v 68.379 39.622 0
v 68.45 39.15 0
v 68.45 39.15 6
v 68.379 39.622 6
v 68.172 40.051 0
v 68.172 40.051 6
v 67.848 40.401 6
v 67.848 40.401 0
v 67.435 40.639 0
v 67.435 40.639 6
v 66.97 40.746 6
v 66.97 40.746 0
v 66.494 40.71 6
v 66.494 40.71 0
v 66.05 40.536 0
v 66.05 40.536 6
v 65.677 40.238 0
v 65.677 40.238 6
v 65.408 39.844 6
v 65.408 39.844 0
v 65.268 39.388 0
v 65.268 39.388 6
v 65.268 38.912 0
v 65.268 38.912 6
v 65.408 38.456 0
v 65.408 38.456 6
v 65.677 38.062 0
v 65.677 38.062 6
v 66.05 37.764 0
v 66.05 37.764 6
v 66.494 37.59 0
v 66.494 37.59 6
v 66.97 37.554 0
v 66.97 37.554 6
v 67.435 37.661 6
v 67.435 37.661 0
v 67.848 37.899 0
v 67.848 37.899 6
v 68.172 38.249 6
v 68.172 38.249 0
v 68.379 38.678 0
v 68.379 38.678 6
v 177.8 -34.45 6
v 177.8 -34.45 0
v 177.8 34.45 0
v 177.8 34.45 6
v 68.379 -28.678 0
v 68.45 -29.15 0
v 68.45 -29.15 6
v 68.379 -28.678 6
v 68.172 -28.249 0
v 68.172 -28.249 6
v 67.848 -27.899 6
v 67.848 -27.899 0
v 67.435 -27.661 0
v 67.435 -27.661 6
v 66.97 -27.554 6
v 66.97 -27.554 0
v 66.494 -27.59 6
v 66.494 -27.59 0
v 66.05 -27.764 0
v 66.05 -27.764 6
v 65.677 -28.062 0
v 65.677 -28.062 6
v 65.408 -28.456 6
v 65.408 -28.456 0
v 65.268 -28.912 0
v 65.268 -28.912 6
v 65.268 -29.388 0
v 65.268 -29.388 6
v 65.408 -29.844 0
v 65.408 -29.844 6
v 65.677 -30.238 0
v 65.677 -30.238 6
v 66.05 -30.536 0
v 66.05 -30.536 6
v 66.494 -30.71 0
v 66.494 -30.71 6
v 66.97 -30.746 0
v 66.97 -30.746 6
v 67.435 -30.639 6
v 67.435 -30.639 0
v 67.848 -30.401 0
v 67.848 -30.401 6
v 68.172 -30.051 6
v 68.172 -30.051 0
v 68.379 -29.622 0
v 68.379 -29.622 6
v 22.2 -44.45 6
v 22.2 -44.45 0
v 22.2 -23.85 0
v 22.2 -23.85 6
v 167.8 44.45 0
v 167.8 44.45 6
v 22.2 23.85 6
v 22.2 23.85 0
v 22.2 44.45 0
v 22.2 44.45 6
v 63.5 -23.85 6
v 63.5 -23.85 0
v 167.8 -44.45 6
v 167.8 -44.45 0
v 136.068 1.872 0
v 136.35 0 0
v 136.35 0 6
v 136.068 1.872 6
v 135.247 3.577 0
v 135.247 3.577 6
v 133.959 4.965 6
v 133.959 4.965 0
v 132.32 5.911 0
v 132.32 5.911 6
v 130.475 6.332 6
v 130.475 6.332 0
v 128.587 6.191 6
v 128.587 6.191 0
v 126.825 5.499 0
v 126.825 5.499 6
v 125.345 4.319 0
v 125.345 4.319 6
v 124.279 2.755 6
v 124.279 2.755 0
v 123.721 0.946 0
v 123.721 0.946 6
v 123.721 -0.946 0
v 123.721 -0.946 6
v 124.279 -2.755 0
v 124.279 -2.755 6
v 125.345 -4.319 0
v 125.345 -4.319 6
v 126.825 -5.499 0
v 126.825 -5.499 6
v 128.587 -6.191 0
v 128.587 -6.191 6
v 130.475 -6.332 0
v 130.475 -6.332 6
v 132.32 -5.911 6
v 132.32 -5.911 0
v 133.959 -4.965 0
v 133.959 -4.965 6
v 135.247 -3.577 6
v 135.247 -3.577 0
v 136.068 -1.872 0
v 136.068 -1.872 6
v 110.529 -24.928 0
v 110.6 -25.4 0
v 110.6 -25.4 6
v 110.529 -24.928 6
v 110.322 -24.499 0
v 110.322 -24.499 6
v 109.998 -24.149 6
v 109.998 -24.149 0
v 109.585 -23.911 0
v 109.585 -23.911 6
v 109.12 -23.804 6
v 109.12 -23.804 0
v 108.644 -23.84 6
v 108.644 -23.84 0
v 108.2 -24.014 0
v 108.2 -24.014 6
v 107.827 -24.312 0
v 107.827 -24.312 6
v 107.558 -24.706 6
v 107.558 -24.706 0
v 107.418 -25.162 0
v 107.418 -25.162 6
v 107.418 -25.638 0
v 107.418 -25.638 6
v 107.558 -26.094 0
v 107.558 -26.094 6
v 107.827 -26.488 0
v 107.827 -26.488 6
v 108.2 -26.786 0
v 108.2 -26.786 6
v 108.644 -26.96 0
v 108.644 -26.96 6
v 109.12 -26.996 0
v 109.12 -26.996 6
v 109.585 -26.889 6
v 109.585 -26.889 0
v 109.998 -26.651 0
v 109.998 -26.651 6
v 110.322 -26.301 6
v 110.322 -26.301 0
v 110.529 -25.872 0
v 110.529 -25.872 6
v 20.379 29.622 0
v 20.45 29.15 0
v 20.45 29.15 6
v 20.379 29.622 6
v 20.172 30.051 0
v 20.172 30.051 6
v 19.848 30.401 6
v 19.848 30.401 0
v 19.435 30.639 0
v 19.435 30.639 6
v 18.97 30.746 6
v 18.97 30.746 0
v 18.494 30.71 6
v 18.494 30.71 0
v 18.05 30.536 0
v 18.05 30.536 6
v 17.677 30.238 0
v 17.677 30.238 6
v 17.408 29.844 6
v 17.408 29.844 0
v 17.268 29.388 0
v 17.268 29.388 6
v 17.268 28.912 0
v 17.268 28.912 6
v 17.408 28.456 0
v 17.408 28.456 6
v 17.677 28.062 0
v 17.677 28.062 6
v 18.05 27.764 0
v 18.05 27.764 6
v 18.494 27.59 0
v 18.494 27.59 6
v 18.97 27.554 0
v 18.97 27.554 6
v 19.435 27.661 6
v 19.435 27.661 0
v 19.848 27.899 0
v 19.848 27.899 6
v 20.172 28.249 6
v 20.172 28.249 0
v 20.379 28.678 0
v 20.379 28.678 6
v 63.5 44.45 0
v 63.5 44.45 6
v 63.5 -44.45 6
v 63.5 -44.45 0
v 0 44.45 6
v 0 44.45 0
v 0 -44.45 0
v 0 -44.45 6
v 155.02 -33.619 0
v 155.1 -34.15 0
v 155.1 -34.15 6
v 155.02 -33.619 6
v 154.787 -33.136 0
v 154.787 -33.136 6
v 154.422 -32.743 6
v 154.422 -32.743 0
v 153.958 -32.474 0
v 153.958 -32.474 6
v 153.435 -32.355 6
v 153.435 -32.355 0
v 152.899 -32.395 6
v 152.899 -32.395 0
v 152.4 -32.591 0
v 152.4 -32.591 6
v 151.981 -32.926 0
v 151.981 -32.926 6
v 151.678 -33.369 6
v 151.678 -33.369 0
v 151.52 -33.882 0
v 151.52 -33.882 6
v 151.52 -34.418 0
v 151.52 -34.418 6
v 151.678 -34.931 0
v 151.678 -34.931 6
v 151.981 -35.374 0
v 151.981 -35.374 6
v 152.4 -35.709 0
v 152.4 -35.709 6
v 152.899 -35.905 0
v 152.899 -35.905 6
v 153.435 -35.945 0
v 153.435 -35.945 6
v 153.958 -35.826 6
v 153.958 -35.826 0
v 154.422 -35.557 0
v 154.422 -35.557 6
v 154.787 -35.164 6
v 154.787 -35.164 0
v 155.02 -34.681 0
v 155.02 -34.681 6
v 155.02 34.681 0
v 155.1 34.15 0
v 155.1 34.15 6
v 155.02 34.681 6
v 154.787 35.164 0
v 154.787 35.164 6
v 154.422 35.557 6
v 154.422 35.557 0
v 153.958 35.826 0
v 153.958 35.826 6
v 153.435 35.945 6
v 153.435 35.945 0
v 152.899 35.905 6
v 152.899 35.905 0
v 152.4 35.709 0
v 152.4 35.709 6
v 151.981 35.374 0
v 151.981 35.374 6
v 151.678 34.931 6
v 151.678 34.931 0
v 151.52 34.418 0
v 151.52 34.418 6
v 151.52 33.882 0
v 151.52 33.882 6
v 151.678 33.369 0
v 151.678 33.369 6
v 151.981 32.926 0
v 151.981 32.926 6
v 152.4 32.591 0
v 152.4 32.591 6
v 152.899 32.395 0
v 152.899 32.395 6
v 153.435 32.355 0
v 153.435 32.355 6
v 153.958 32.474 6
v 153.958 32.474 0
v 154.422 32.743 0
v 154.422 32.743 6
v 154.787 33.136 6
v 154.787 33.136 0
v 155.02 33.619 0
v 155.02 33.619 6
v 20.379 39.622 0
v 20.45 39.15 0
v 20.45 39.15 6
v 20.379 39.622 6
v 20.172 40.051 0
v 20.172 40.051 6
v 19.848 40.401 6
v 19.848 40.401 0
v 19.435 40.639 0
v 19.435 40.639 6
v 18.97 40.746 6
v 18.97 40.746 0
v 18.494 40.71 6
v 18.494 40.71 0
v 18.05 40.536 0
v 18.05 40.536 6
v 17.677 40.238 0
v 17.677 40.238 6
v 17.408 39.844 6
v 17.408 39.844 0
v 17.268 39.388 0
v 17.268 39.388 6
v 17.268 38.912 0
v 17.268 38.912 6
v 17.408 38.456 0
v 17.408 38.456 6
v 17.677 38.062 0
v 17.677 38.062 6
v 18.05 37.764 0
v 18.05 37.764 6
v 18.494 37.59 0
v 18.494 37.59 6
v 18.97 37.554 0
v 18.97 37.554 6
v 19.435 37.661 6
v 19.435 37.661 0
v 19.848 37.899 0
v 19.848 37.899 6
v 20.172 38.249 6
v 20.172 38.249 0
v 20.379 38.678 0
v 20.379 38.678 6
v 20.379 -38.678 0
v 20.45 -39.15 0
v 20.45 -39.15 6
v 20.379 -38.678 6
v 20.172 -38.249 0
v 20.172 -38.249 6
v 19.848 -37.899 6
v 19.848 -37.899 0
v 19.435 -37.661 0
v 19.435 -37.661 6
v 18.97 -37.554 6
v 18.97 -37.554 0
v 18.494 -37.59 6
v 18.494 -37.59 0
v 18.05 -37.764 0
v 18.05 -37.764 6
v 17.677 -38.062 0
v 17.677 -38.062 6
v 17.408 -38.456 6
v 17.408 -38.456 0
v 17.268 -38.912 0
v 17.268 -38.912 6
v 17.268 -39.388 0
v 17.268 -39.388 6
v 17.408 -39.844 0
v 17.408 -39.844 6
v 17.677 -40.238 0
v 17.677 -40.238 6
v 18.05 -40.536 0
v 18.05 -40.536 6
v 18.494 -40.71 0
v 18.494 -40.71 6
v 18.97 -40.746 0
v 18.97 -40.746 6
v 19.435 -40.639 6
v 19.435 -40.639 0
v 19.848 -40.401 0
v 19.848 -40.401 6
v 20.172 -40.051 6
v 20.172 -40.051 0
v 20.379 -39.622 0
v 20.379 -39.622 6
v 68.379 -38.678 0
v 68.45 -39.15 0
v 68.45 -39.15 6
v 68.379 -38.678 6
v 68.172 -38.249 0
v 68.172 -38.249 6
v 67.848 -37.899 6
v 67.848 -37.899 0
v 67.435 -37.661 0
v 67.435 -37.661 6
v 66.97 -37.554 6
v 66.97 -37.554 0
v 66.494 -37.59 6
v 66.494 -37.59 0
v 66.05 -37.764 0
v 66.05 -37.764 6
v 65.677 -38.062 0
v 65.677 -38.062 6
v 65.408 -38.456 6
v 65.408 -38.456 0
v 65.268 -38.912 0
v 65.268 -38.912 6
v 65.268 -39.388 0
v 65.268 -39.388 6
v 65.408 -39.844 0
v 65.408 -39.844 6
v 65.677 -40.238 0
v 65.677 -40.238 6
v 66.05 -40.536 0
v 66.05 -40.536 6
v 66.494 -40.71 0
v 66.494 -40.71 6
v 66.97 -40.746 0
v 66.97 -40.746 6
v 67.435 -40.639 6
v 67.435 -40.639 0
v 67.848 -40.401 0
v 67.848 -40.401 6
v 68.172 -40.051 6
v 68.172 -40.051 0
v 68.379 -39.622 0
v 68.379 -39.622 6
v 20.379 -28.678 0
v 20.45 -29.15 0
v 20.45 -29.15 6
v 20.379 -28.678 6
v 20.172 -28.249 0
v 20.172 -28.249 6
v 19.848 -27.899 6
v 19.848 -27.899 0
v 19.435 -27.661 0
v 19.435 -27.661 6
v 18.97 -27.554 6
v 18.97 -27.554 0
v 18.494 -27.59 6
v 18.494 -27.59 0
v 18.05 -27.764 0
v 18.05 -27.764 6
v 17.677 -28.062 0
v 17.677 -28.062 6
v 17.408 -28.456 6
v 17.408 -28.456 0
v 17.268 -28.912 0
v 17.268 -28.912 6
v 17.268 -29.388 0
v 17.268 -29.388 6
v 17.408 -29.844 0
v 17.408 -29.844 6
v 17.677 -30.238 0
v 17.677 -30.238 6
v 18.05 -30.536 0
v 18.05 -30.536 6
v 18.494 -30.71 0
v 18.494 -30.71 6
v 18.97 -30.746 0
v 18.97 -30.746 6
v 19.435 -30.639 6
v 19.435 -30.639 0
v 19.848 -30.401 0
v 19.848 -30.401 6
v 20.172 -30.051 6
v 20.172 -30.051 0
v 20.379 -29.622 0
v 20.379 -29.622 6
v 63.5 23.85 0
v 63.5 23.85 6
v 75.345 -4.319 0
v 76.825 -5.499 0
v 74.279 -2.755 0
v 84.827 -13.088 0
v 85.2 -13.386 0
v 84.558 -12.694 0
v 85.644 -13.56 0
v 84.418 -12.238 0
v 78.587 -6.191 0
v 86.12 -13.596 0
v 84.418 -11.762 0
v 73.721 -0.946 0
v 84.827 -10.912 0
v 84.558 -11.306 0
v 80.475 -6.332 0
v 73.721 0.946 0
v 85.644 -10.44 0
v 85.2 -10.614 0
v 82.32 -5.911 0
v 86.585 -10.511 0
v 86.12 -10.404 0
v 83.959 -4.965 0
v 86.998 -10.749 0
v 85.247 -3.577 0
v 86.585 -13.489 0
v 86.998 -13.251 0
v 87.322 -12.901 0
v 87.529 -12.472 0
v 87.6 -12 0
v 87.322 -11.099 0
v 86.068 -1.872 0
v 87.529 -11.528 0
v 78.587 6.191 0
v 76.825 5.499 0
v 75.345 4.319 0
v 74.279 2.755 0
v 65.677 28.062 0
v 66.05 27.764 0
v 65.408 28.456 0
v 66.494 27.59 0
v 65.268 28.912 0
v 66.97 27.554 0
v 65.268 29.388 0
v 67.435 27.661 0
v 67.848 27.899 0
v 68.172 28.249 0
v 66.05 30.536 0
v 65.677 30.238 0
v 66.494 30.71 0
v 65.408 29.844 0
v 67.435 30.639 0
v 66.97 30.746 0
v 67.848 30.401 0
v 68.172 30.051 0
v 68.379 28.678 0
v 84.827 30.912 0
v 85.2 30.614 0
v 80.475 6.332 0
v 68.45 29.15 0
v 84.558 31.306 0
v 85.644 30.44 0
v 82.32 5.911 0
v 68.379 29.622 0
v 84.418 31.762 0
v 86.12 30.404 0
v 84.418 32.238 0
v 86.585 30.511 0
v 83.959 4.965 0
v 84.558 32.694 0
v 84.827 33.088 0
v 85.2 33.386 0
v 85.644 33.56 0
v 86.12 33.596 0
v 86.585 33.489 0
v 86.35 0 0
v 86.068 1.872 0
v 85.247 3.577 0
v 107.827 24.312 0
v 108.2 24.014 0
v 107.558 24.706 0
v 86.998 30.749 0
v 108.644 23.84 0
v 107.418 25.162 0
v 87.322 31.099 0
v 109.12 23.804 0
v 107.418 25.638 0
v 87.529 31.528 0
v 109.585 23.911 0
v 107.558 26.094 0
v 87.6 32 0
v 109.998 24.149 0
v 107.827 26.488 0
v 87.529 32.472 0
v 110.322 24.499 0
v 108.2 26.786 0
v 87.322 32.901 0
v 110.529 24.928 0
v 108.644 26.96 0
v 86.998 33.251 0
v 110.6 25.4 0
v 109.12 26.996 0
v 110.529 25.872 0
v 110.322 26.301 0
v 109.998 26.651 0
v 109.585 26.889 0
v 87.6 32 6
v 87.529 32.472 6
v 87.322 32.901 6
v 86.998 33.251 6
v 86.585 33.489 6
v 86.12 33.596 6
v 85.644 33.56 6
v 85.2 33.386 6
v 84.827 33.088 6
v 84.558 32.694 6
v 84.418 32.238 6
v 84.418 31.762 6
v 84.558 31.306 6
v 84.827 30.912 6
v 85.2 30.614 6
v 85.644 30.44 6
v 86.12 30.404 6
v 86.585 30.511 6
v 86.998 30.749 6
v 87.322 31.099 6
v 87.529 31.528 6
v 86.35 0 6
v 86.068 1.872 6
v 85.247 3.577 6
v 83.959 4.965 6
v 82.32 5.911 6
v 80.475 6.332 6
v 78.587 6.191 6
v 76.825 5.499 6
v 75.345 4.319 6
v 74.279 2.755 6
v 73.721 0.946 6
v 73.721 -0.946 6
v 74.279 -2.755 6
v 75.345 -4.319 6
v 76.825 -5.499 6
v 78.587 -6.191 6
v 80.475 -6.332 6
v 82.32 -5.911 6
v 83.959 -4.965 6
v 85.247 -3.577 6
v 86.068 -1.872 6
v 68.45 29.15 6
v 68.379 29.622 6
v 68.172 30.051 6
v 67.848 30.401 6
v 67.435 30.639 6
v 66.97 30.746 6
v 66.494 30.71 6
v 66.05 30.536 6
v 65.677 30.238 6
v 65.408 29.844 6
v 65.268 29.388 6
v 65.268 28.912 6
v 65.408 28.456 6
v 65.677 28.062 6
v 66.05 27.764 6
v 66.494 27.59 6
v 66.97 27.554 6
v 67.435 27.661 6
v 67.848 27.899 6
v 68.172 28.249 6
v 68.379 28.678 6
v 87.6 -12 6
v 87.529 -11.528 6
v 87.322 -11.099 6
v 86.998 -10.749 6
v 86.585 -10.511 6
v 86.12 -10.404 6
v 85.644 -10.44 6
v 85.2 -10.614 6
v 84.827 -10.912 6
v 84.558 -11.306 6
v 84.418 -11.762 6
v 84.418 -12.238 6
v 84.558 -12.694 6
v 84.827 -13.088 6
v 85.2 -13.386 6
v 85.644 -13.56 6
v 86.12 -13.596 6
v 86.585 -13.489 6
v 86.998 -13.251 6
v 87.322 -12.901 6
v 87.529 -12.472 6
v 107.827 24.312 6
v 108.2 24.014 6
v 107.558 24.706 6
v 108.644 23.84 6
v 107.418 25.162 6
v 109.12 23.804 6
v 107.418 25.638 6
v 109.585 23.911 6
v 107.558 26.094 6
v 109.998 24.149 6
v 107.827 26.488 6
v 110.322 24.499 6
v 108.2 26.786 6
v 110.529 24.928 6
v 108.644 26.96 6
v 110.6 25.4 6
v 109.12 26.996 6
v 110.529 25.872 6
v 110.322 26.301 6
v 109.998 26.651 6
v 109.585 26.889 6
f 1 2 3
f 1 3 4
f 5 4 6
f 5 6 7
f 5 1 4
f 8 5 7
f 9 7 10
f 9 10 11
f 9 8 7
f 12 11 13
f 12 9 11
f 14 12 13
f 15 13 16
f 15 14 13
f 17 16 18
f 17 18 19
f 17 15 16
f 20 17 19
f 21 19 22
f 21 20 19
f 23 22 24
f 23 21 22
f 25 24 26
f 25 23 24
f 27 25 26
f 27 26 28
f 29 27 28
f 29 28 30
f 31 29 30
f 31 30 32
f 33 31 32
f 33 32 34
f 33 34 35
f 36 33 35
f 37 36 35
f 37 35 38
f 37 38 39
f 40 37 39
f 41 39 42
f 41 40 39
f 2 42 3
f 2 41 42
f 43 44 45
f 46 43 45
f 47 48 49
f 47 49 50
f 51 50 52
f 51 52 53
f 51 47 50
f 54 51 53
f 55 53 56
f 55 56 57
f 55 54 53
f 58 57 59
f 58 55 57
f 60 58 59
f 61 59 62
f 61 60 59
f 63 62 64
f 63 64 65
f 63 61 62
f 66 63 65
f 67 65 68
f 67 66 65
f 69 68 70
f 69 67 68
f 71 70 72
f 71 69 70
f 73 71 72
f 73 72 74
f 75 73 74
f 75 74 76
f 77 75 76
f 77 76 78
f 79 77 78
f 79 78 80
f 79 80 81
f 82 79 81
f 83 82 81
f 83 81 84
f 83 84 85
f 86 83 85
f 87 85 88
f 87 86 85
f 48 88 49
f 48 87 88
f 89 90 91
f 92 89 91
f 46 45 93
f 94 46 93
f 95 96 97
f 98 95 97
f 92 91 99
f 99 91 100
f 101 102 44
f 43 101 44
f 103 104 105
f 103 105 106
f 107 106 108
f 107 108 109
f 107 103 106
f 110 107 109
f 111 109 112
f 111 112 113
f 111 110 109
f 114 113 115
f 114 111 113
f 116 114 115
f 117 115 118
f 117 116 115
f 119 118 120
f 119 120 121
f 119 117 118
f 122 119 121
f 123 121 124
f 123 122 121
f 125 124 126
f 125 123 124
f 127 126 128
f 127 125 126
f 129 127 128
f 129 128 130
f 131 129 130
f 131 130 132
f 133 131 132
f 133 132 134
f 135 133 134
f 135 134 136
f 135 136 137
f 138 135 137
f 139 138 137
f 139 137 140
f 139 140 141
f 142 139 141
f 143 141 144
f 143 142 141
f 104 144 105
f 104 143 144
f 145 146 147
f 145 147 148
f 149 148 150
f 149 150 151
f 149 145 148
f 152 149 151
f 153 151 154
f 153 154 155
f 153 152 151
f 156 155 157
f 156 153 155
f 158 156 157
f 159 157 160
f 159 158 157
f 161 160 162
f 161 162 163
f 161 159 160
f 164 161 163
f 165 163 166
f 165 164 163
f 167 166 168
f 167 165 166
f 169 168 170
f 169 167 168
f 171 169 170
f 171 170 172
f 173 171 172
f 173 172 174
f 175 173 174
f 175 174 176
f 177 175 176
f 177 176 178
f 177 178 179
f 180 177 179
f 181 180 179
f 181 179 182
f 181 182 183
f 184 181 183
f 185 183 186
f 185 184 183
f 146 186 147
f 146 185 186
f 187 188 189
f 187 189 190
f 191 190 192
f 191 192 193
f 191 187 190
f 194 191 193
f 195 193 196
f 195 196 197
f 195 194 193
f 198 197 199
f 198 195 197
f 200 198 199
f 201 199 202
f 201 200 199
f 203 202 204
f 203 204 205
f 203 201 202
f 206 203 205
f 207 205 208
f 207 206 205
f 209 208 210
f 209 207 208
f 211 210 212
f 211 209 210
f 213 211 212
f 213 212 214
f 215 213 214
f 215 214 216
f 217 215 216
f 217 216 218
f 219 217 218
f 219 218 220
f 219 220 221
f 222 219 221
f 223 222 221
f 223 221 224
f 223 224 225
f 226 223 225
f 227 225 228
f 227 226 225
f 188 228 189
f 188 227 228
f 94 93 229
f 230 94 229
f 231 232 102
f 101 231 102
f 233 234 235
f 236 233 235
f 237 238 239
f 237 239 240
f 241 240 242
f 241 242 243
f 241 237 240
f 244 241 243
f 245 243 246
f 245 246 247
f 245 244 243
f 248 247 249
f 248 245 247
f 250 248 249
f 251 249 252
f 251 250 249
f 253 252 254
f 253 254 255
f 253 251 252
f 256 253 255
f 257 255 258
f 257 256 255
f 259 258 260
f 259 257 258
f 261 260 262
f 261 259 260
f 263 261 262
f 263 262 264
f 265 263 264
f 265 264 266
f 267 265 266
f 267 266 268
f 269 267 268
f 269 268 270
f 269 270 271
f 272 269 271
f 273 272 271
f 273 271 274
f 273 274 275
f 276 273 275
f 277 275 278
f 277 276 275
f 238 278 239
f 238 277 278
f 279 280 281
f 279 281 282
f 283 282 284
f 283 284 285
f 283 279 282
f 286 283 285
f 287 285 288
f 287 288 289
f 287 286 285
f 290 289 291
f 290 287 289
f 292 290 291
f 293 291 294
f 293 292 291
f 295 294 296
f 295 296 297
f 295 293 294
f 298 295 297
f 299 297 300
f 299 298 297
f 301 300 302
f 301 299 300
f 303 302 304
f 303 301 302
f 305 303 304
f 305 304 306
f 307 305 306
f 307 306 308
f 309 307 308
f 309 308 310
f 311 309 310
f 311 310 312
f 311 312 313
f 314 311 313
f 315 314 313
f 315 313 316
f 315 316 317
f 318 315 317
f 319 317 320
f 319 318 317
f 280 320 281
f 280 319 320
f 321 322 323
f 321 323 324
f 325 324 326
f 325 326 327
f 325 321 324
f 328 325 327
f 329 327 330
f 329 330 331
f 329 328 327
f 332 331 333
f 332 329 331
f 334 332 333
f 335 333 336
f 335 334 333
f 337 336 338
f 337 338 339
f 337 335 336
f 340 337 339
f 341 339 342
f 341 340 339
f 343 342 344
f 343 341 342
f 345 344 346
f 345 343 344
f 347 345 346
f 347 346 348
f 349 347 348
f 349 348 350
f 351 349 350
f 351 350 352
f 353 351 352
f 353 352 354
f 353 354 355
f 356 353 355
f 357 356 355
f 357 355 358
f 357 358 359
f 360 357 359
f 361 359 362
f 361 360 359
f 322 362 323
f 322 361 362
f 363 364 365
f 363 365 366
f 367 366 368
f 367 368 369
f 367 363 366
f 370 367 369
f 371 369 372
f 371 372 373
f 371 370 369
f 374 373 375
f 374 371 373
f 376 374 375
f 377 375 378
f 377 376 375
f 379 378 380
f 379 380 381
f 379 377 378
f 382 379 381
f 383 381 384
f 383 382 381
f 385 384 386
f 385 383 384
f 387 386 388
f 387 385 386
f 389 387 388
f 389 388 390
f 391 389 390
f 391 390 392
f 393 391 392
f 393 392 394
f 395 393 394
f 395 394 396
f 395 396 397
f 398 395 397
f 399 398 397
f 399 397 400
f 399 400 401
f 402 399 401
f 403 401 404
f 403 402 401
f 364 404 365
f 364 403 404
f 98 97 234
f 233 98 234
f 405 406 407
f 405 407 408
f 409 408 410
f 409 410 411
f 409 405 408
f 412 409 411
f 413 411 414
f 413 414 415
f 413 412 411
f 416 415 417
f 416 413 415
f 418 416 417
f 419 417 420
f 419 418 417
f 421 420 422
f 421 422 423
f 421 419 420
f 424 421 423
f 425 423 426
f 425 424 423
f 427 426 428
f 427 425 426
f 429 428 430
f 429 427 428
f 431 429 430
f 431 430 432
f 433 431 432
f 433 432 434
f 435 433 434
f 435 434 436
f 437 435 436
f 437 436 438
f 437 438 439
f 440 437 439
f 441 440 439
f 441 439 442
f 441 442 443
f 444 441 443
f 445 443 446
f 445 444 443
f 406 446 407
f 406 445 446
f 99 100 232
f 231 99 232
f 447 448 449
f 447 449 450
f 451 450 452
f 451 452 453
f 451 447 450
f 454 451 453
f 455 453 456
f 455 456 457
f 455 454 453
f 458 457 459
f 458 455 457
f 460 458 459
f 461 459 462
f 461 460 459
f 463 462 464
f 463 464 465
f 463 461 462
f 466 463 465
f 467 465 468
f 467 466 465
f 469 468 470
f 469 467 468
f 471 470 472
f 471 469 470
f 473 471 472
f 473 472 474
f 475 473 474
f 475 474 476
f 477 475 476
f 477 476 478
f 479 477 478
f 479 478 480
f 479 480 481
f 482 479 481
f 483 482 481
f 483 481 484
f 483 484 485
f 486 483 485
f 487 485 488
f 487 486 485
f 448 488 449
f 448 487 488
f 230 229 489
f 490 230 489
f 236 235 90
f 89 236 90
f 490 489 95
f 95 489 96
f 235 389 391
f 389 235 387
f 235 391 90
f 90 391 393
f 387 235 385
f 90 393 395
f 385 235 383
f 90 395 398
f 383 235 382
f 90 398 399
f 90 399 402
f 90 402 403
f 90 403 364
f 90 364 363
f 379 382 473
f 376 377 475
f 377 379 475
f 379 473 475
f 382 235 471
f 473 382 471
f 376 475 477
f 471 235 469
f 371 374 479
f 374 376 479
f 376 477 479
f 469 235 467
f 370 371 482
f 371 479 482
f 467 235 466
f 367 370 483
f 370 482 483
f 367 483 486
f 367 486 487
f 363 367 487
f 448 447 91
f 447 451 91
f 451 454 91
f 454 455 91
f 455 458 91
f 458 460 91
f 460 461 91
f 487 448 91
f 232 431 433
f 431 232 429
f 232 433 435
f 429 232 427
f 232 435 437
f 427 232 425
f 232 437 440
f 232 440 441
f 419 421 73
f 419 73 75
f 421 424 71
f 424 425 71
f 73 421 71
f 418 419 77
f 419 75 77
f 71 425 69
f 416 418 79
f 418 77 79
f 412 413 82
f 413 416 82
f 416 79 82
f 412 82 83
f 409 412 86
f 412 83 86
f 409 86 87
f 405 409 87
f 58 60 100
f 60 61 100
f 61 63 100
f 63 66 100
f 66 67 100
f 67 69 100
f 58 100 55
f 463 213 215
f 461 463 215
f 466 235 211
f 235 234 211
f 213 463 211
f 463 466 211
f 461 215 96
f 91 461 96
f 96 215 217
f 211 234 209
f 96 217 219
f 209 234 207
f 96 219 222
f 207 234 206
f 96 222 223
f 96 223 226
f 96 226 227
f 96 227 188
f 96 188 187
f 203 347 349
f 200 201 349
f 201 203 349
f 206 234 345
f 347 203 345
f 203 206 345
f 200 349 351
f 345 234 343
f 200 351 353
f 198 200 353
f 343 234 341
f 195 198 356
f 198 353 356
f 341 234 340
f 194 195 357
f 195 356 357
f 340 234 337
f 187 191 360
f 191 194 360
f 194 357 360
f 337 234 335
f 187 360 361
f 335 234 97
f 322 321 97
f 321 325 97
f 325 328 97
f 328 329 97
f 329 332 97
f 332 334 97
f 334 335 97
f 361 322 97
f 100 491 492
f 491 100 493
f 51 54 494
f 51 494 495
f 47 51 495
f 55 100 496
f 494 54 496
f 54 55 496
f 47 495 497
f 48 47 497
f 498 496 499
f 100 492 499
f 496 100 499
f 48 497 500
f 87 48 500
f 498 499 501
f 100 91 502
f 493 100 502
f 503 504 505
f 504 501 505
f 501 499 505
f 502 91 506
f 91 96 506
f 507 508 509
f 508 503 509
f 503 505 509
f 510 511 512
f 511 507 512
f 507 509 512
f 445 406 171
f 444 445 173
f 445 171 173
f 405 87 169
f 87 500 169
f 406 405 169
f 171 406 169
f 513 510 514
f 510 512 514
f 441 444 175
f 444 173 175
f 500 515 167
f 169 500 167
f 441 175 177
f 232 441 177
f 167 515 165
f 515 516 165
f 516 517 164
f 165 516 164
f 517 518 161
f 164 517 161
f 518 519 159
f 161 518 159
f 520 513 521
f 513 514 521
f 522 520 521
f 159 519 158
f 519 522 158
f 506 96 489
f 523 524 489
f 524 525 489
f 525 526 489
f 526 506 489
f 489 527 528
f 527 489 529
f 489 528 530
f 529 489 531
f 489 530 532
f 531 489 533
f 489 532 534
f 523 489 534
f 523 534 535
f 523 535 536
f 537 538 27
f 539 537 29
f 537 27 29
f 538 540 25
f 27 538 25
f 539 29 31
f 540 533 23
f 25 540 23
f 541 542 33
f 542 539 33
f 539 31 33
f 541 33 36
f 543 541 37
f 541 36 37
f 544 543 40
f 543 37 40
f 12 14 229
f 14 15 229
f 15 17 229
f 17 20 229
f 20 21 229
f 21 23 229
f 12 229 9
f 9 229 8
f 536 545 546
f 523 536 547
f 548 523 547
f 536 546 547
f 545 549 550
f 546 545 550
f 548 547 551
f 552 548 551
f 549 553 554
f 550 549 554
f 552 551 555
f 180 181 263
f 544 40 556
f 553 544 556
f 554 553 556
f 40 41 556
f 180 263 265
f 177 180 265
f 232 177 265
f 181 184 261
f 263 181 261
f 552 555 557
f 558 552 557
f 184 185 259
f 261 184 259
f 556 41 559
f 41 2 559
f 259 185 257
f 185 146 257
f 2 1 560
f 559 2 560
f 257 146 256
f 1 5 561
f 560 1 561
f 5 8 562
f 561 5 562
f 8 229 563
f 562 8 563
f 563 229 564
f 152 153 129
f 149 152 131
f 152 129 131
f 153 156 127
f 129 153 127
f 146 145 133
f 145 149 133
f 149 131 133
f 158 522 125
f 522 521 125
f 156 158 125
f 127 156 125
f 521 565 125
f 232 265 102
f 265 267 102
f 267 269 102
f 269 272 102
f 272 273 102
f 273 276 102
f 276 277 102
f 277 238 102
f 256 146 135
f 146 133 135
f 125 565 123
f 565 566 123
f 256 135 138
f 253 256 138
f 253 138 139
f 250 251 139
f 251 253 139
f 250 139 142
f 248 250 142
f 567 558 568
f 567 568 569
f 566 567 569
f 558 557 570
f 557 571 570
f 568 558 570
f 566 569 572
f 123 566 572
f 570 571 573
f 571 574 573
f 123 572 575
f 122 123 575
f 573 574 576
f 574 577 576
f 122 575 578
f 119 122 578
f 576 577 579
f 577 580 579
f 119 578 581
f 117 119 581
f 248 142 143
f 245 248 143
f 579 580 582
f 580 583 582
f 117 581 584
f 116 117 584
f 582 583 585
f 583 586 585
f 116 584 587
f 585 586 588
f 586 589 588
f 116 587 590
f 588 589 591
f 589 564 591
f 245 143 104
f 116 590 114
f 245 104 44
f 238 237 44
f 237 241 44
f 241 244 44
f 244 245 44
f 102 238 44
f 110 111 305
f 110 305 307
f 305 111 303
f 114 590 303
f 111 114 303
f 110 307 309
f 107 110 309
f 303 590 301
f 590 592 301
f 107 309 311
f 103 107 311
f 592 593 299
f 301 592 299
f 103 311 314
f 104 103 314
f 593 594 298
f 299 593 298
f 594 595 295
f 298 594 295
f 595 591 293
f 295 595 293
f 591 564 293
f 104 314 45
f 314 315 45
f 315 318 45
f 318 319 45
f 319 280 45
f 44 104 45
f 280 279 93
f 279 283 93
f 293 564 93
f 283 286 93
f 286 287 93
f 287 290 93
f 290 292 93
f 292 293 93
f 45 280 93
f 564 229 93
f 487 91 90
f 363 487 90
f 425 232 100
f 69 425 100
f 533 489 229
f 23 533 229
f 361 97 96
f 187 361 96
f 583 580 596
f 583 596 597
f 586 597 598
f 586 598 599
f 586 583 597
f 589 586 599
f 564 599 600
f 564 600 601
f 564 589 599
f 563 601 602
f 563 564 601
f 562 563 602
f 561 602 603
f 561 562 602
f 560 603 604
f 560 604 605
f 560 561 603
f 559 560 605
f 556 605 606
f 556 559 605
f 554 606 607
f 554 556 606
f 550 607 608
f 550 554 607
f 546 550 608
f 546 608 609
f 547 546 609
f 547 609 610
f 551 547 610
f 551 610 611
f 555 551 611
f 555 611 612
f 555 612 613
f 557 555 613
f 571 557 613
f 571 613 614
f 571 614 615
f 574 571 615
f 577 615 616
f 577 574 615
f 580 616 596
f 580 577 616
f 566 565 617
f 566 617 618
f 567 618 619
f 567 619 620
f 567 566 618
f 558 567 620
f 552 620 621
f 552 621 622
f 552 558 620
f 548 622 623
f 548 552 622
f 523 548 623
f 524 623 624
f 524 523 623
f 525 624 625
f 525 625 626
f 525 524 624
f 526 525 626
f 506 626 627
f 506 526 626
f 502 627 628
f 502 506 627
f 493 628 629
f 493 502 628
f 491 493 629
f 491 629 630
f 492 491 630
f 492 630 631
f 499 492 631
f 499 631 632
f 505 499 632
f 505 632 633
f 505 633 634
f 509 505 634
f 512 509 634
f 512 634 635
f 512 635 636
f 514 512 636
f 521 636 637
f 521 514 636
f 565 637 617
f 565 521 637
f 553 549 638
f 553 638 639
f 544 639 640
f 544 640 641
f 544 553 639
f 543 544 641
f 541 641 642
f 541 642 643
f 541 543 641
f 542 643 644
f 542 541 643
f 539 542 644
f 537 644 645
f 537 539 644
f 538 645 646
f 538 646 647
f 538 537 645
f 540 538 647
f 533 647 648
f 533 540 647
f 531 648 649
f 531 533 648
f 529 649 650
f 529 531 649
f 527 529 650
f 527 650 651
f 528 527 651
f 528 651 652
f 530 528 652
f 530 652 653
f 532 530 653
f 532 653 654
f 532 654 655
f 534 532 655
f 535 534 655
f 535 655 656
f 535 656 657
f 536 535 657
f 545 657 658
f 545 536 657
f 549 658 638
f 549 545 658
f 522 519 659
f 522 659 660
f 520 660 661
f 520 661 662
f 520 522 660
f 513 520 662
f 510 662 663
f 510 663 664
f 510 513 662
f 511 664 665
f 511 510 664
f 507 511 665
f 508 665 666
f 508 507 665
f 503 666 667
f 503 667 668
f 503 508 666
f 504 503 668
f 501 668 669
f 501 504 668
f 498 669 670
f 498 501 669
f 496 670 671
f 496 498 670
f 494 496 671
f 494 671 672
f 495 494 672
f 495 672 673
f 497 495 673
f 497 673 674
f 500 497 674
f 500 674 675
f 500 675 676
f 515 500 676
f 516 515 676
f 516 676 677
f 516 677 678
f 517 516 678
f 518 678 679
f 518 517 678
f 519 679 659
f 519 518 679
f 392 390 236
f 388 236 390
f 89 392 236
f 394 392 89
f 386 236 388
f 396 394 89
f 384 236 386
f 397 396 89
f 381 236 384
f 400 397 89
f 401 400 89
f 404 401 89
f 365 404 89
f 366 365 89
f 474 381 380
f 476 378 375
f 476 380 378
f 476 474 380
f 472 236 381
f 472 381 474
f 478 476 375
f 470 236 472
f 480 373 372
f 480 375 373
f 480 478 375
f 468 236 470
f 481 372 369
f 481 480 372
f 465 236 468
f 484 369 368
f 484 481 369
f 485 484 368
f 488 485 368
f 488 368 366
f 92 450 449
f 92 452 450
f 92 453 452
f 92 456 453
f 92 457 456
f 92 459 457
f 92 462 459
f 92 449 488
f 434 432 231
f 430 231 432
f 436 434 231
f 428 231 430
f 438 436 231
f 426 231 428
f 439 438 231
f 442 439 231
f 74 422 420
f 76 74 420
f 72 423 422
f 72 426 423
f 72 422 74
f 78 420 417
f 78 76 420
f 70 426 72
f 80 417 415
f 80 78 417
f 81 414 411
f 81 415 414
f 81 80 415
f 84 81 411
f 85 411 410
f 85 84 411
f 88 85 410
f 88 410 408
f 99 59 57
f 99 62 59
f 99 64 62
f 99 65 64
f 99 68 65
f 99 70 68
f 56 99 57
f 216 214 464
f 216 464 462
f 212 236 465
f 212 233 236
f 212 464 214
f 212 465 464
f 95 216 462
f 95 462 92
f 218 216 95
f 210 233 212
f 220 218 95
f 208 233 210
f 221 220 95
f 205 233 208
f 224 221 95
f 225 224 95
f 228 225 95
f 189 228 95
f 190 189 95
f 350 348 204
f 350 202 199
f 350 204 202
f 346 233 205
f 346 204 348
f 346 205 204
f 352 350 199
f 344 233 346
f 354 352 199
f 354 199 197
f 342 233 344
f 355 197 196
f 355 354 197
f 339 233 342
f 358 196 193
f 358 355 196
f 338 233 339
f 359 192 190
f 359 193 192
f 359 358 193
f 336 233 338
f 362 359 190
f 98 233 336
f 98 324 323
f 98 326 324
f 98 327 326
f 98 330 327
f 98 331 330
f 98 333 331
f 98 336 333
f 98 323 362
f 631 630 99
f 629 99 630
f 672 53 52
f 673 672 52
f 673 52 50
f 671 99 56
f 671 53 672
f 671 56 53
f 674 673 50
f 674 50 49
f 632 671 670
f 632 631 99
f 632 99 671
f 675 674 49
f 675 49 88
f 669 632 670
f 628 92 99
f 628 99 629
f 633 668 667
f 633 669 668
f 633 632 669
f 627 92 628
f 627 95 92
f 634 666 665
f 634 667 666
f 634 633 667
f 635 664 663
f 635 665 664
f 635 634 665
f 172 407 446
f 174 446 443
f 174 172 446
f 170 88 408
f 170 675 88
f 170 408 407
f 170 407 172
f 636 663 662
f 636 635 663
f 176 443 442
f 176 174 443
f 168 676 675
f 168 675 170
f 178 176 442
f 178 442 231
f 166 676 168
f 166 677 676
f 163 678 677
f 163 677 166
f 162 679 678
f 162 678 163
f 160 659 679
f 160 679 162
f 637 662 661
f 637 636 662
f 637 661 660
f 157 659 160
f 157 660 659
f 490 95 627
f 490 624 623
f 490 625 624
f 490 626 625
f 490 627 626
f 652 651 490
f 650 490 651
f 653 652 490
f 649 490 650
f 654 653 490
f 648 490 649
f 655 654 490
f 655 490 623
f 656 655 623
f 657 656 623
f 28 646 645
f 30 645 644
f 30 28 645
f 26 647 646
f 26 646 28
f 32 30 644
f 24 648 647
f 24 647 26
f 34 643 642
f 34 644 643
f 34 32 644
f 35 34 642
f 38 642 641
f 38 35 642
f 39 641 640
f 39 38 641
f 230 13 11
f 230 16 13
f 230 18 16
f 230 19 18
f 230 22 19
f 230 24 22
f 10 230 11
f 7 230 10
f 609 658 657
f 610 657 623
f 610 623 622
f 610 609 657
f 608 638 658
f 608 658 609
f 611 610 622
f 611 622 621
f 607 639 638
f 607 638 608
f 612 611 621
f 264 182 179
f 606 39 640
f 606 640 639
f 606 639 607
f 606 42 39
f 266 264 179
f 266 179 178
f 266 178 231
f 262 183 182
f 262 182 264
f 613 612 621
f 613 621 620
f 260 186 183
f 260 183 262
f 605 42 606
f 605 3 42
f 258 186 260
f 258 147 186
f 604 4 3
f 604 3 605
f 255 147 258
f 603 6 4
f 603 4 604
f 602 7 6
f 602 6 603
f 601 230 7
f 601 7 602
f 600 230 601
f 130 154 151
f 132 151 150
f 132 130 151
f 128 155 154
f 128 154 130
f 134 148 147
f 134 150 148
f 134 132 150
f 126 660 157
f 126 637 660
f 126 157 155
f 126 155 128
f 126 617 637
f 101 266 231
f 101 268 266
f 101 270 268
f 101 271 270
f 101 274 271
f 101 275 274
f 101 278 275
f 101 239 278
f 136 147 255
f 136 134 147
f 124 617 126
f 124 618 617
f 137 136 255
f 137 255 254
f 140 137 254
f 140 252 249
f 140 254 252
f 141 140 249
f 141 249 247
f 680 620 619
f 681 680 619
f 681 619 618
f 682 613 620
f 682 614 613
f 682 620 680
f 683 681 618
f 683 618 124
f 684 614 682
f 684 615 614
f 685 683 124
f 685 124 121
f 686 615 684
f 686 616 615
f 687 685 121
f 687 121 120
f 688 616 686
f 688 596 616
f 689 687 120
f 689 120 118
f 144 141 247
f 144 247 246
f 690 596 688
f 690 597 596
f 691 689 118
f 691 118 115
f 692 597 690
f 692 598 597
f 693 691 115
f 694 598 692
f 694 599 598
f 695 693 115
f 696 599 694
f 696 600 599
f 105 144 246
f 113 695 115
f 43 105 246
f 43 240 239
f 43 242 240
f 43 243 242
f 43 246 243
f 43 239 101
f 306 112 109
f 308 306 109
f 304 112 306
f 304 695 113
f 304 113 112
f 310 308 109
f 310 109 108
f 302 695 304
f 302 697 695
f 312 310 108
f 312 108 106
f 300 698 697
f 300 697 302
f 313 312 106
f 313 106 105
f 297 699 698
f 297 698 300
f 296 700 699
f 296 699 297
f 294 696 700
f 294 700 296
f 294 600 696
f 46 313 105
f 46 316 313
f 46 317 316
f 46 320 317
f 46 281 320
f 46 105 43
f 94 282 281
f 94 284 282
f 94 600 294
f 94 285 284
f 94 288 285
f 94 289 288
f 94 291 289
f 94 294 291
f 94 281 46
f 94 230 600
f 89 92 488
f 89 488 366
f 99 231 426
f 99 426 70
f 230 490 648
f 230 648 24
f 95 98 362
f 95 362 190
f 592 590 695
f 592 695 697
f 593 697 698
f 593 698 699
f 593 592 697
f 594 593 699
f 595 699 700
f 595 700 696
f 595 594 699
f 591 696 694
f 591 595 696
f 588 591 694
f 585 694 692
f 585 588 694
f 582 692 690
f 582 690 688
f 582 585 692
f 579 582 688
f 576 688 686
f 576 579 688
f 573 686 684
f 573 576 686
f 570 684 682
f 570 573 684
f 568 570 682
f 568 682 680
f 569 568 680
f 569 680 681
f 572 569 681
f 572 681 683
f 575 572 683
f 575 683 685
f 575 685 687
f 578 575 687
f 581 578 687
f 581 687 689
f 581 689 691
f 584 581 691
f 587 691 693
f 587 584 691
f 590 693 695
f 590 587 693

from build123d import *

# Parameters (mm, degrees)
SKETCH1_R           = 1.6
SKETCH1_R_2         = 1.8
SKETCH1_R_3         = 6.35
BOSS_EXTRUDE1_DEPTH = 6


with BuildPart() as part:
    # Sketch1 → Boss-Extrude1 (new body)
    with BuildSketch(Plane.XY):
        Polygon((0, -44.45), (22.2, -44.45), (22.2, -23.85), (63.5, -23.85), (63.5, -44.45), (167.8, -44.45), (177.8, -34.45), (177.8, 34.45), (167.8, 44.45), (63.5, 44.45), (63.5, 23.85), (22.2, 23.85), (22.2, 44.45), (0, 44.45), align=None)
        with Locations((18.85, 29.15)):
            Circle(SKETCH1_R, mode=Mode.SUBTRACT)
        with Locations((18.85, 39.15)):
            Circle(SKETCH1_R, mode=Mode.SUBTRACT)
        with Locations((66.85, 29.15)):
            Circle(SKETCH1_R, mode=Mode.SUBTRACT)
        with Locations((66.85, 39.15)):
            Circle(SKETCH1_R, mode=Mode.SUBTRACT)
        with Locations((153.3, 34.15)):
            Circle(SKETCH1_R_2, mode=Mode.SUBTRACT)
        with Locations((109, 25.4)):
            Circle(SKETCH1_R, mode=Mode.SUBTRACT)
        with Locations((18.85, -29.15)):
            Circle(SKETCH1_R, mode=Mode.SUBTRACT)
        with Locations((18.85, -39.15)):
            Circle(SKETCH1_R, mode=Mode.SUBTRACT)
        with Locations((66.85, -29.15)):
            Circle(SKETCH1_R, mode=Mode.SUBTRACT)
        with Locations((66.85, -39.15)):
            Circle(SKETCH1_R, mode=Mode.SUBTRACT)
        with Locations((153.3, -34.15)):
            Circle(SKETCH1_R_2, mode=Mode.SUBTRACT)
        with Locations((109, -25.4)):
            Circle(SKETCH1_R, mode=Mode.SUBTRACT)
        with Locations((86, -12)):
            Circle(SKETCH1_R, mode=Mode.SUBTRACT)
        with Locations((86, 32)):
            Circle(SKETCH1_R, mode=Mode.SUBTRACT)
        with Locations((80, 0)):
            Circle(SKETCH1_R_3, mode=Mode.SUBTRACT)
        with Locations((130, 0)):
            Circle(SKETCH1_R_3, mode=Mode.SUBTRACT)
    extrude(amount=BOSS_EXTRUDE1_DEPTH)


solid = part.part
